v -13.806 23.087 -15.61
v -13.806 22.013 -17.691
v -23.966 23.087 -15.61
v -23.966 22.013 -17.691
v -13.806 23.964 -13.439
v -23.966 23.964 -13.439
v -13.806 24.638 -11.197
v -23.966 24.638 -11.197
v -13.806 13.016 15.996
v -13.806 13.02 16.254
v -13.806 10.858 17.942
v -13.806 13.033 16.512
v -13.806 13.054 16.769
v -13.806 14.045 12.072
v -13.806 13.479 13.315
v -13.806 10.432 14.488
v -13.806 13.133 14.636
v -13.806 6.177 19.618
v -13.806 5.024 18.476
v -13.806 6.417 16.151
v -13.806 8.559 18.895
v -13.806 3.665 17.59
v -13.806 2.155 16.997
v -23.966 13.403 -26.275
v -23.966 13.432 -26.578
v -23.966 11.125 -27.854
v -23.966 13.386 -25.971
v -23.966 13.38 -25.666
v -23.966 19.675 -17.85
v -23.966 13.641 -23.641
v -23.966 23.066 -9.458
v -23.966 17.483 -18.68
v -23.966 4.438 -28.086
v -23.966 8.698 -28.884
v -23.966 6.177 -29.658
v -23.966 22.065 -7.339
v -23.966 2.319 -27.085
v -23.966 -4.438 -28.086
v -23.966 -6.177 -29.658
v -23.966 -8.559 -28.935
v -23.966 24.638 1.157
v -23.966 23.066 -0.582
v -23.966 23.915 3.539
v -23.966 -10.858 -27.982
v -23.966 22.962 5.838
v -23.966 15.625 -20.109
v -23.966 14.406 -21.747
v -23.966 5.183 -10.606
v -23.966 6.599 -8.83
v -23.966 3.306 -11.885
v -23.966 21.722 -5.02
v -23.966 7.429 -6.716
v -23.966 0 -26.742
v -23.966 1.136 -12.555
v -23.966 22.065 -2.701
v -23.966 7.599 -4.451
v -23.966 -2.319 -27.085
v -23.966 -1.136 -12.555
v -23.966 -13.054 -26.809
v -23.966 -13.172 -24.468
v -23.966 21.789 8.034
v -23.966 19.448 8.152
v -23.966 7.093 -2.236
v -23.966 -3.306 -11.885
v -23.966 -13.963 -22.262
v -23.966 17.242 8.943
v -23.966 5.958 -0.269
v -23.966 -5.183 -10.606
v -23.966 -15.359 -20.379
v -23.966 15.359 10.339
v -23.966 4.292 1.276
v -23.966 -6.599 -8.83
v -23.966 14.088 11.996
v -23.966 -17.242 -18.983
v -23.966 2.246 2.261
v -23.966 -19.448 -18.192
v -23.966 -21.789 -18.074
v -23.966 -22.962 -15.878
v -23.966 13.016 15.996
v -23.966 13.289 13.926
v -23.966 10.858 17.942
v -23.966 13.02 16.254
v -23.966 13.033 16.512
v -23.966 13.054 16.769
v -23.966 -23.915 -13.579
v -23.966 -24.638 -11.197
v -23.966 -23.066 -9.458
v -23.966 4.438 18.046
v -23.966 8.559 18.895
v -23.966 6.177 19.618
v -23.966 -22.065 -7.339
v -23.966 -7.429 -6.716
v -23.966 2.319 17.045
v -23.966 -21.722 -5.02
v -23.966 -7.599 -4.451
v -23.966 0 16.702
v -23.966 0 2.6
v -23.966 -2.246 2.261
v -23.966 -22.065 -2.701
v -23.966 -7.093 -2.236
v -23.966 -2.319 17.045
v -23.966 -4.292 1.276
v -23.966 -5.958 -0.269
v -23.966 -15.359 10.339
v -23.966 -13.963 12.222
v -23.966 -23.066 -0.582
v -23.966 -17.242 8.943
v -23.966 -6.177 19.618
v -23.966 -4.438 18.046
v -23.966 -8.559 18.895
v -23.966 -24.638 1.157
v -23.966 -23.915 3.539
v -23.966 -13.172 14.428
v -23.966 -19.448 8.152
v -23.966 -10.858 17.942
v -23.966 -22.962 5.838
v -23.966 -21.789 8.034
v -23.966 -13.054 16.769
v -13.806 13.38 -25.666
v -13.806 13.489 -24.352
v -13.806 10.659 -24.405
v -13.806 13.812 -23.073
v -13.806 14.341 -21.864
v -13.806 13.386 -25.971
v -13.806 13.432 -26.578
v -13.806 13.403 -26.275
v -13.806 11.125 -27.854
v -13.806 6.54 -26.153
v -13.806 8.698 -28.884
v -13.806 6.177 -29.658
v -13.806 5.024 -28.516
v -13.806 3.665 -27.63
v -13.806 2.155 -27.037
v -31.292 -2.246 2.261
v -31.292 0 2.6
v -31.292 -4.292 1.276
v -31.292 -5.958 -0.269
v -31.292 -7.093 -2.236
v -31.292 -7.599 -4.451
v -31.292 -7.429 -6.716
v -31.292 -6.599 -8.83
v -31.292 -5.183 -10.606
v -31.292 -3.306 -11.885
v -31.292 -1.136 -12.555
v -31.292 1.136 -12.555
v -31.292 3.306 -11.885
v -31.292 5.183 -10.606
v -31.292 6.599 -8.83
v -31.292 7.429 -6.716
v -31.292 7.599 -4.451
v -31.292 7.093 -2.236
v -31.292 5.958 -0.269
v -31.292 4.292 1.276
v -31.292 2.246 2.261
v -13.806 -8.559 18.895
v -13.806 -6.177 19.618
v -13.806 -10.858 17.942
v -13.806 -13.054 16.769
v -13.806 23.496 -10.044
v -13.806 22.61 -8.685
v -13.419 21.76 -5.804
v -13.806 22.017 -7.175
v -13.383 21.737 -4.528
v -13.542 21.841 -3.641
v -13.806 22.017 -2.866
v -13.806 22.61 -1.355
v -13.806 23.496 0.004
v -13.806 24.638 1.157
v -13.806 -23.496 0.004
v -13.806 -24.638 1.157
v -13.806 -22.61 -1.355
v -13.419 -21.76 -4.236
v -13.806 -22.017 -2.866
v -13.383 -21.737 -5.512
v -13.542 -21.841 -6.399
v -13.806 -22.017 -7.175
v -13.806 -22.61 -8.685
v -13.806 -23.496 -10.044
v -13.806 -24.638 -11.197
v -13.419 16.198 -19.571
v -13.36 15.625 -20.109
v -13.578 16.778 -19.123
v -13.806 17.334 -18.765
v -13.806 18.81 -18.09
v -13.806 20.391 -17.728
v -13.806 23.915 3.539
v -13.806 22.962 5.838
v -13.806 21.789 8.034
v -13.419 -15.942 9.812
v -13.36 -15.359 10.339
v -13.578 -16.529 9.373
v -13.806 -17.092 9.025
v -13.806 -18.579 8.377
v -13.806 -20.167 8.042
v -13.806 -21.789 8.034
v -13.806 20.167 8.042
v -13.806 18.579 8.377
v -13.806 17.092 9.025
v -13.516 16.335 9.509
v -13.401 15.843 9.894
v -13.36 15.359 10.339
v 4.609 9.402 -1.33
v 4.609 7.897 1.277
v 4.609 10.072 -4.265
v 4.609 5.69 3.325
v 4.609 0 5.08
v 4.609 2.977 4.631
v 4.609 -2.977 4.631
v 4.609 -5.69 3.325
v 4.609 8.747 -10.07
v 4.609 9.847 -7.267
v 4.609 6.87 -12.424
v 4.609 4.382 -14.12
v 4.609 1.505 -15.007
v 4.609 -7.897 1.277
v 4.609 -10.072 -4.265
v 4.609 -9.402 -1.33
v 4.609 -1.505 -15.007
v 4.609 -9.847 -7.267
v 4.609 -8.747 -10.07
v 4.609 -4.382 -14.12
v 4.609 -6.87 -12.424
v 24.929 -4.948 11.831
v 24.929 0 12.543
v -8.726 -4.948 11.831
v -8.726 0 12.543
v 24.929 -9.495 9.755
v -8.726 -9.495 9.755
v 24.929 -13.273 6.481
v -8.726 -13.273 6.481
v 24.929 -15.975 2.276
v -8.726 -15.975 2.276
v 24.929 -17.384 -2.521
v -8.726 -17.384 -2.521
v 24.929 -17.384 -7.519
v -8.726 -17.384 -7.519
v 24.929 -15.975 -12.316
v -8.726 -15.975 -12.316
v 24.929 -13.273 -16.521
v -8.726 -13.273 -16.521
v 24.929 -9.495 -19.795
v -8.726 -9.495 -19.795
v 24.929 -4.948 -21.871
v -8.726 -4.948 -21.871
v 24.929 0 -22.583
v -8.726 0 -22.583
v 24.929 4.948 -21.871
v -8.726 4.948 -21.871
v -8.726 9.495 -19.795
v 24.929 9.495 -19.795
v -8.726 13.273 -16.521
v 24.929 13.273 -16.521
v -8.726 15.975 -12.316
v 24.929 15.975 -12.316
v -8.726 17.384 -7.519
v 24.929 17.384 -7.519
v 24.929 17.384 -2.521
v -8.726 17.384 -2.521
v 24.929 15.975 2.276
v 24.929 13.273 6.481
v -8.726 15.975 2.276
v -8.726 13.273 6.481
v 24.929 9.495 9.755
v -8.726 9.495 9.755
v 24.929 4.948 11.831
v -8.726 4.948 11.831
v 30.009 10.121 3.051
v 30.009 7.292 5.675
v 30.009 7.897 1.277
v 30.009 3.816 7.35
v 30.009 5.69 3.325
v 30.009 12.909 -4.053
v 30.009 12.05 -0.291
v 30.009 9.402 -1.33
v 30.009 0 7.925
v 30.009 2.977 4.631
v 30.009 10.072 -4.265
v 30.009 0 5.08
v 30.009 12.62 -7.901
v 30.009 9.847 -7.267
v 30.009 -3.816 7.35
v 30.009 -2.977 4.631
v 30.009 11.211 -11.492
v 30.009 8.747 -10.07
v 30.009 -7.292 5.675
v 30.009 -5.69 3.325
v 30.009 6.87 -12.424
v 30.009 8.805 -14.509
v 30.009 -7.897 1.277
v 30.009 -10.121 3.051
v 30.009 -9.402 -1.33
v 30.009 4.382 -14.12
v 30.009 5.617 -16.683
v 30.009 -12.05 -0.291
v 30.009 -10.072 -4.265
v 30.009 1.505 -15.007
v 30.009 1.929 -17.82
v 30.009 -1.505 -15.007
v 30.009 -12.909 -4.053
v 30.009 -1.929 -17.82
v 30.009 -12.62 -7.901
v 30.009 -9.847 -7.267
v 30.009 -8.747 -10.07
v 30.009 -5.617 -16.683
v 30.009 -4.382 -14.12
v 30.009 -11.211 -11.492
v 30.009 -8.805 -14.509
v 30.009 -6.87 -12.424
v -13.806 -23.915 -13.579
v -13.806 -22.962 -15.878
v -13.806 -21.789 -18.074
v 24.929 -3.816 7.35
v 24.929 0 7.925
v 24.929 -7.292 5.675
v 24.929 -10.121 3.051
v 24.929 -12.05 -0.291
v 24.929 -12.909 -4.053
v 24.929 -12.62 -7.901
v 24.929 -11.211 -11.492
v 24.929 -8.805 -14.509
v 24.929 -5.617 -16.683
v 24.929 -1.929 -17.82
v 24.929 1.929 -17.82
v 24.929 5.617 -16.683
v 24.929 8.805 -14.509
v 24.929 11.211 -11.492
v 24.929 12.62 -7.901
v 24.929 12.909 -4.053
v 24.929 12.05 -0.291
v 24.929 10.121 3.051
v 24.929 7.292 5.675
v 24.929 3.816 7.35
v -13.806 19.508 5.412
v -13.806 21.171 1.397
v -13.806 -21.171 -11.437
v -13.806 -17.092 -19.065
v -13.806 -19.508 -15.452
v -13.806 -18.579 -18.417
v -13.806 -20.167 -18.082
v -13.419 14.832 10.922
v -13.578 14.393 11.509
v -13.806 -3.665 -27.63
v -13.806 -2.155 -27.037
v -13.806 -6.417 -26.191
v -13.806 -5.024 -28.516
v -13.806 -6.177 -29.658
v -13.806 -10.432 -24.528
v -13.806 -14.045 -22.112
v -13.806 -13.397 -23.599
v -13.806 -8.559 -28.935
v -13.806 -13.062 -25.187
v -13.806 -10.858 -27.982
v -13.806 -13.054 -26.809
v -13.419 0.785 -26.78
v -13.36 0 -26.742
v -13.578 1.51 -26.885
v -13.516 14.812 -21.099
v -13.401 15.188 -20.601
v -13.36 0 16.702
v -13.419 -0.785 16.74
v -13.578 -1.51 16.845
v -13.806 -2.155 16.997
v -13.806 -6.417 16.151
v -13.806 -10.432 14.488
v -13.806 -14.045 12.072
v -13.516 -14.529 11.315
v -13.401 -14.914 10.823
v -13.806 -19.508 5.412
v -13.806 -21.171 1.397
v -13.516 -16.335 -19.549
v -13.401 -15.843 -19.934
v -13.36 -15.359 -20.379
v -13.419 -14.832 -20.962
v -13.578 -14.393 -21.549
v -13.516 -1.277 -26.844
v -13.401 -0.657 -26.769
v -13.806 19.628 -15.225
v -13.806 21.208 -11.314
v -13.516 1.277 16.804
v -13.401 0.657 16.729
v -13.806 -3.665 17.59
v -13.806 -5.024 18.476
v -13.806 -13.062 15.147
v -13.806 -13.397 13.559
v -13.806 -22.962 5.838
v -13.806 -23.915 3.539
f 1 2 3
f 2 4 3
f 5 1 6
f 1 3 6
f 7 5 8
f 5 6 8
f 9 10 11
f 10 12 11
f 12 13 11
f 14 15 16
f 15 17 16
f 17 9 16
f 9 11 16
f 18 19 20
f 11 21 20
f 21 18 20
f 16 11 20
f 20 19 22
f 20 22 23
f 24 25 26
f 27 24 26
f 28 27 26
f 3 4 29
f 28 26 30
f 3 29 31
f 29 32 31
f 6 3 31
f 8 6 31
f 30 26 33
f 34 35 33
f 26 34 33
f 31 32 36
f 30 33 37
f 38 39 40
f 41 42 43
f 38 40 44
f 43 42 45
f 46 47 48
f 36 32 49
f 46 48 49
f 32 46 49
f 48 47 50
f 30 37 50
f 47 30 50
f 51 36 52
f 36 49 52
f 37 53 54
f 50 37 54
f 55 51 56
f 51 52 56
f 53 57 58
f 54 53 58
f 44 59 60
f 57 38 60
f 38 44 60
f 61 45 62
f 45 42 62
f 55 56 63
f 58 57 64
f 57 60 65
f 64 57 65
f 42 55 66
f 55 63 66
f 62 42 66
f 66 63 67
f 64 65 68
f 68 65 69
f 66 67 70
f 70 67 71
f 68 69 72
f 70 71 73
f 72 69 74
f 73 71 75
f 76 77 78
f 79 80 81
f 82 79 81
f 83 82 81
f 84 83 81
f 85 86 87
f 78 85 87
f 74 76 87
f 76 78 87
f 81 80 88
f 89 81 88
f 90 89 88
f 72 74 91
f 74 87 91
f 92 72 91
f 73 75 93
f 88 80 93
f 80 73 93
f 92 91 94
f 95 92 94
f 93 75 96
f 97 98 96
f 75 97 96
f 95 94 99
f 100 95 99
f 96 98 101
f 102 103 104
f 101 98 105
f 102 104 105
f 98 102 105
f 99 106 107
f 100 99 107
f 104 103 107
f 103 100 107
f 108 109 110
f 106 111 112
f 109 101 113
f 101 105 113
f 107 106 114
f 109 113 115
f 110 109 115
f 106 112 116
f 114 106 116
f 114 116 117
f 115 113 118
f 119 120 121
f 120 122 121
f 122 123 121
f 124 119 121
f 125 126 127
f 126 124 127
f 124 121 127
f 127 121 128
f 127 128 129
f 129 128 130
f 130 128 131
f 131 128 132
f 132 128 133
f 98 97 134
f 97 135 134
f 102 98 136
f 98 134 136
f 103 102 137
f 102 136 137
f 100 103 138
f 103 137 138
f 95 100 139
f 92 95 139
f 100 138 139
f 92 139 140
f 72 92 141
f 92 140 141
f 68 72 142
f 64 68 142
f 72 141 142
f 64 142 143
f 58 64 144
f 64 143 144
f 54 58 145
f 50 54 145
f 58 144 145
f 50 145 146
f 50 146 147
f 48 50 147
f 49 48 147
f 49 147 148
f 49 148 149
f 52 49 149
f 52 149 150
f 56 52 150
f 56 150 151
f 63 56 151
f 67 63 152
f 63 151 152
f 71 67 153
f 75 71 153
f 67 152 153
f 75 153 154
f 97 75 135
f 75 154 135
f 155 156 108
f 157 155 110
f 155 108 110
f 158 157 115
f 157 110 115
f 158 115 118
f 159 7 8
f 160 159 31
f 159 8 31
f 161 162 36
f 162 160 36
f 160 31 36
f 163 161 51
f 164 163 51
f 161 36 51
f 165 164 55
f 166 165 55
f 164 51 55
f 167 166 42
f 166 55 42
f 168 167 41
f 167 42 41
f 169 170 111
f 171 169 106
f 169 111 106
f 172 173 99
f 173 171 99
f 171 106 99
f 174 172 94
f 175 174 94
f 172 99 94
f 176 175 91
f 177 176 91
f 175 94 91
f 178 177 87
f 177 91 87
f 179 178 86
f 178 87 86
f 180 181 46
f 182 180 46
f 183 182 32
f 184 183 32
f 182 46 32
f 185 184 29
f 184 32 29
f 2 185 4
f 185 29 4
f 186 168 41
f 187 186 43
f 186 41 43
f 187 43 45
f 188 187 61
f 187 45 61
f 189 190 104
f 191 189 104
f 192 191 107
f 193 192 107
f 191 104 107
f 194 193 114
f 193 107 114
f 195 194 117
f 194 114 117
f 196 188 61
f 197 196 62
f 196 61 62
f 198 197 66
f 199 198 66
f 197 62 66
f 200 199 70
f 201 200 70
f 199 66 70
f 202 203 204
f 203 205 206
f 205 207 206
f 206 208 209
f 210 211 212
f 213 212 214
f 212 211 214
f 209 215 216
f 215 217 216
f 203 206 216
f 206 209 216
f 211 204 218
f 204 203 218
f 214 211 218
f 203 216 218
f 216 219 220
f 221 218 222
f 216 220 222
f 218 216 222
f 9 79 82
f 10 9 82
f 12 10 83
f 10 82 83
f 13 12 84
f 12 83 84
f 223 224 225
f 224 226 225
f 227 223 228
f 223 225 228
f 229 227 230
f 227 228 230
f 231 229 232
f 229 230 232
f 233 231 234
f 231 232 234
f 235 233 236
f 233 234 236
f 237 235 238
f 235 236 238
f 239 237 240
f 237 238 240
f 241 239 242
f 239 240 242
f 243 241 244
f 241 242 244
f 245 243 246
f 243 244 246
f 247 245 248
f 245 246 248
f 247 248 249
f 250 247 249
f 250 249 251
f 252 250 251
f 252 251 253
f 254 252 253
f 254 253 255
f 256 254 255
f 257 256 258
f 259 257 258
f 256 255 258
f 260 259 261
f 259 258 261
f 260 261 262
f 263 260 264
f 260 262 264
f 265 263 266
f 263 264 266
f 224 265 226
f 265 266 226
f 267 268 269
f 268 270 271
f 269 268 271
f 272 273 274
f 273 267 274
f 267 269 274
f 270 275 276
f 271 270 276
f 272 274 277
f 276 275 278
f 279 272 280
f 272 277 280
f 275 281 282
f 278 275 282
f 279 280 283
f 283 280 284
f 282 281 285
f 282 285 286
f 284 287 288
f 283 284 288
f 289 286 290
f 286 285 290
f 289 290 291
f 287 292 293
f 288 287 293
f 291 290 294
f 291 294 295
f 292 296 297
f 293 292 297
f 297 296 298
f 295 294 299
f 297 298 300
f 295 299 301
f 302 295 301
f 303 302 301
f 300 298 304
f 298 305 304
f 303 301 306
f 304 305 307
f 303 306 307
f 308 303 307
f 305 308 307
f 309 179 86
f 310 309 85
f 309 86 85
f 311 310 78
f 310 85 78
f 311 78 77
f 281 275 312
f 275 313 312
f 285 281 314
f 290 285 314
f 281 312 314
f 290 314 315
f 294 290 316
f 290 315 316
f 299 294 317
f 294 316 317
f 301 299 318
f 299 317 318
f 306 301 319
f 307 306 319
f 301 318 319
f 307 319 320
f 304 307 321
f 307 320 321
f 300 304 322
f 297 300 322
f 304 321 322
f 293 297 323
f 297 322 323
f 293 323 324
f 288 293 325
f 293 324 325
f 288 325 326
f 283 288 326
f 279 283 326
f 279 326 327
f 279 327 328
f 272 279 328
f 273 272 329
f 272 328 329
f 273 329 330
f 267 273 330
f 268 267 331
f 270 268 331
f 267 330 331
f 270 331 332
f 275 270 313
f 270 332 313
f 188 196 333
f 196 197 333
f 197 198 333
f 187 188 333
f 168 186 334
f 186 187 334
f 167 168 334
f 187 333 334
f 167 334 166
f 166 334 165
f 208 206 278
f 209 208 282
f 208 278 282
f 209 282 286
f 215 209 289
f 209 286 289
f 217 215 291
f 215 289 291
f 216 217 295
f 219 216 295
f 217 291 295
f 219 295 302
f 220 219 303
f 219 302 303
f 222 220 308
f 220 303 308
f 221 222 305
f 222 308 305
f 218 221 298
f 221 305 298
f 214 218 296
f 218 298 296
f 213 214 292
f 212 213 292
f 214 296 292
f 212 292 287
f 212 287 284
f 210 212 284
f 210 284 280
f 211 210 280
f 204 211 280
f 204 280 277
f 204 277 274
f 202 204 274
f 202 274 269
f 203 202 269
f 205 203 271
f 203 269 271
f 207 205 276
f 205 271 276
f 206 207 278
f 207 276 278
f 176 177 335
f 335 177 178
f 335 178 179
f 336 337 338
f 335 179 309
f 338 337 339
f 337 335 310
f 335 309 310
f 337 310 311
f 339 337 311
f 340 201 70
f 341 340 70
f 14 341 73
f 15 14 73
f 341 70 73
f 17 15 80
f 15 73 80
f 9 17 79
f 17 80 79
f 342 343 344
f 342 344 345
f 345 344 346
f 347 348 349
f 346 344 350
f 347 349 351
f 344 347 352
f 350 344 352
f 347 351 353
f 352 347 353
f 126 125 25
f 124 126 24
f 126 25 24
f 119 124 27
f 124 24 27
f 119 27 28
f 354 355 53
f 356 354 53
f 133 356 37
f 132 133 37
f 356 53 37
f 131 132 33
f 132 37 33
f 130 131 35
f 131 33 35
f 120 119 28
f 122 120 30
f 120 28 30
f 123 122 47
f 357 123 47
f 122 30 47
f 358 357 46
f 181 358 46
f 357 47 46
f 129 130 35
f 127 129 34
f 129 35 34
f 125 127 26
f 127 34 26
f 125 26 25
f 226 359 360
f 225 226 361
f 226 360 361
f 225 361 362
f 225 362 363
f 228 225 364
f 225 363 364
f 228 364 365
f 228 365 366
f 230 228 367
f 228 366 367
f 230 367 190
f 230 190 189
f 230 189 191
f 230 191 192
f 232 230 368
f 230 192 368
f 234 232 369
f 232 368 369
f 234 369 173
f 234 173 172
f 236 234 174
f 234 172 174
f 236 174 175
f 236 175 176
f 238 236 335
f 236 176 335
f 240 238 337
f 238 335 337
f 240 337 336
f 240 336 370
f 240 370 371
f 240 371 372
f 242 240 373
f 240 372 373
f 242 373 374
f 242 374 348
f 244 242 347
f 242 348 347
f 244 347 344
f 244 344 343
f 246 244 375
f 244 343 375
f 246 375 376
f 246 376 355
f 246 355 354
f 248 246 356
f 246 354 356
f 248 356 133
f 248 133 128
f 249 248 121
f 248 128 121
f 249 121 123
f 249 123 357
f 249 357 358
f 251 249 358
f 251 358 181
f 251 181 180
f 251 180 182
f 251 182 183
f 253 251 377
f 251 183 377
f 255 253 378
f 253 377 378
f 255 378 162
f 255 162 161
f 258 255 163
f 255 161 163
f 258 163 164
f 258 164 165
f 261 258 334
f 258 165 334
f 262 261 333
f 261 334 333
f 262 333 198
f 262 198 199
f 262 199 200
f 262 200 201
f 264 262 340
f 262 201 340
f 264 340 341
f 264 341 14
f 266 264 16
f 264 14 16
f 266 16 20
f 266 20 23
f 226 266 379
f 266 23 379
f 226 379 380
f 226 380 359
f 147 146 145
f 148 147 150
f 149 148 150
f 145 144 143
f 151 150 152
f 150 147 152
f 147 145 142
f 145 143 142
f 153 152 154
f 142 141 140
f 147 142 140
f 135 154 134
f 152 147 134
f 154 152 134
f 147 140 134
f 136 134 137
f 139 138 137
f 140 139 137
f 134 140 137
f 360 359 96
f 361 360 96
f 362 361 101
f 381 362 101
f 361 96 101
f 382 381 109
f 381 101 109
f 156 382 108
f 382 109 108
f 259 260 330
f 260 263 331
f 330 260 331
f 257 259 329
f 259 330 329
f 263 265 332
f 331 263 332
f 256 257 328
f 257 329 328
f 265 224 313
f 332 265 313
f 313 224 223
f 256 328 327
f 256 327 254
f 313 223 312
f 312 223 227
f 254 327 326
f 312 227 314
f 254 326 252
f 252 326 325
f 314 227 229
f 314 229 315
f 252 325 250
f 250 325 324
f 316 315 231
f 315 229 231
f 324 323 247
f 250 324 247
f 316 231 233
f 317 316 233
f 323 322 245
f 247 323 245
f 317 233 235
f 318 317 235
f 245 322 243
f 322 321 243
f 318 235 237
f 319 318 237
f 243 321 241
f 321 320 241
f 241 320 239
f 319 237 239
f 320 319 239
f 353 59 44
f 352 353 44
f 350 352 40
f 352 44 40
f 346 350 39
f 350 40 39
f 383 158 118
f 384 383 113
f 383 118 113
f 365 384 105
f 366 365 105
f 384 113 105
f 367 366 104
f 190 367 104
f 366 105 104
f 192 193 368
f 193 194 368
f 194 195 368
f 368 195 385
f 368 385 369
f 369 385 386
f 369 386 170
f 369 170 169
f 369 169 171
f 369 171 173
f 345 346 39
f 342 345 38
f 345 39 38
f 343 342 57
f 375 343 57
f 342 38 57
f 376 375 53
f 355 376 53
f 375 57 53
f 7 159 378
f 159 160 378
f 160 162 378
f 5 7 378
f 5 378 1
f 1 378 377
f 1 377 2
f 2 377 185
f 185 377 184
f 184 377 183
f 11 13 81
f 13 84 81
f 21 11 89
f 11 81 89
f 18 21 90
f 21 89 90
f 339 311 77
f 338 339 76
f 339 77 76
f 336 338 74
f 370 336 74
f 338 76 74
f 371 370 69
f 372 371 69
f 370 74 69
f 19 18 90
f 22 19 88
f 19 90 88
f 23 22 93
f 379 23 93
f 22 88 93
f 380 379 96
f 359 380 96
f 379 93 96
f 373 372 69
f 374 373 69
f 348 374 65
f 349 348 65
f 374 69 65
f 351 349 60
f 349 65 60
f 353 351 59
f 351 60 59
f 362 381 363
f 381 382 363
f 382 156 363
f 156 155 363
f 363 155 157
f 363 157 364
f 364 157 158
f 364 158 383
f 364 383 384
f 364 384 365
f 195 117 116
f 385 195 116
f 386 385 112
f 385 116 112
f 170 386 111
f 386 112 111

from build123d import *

# Parameters (mm, degrees)
F2_R     = 8
F3_DEPTH = 25


with BuildPart() as f1:
    # F0 (on Front) → F1 (revolve)
    with BuildSketch(Plane.XZ):
        Polygon((24.92856, 7.9248), (24.92856, 12.542502), (-8.72644, 12.542502), (-13.80644, 17.102293), (-13.80644, 20.379981), (-23.96644, 20.379981), (-23.96644, 2.599981), (-31.292418, 2.599981), (-31.292418, -5.020019), (4.60856, -5.020019), (4.60856, 5.08), (30.00856, 5.08), (30.00856, 7.9248), align=None)
    revolve(axis=Axis((-13.341929, 0, -5.020019), (1, 0, 0)))

    # F2 (on face) → F3 (cut)
    with BuildSketch(Plane(origin=(-23.96644, 0, 0), x_dir=(0, -1, 0), z_dir=(-1, 0, 0))):
        with BuildLine():
            ThreePointArc((8, 24.70155), (-5.656854, 30.358404), (0, 16.70155))
            ThreePointArc((0, 16.70155), (5.656854, 19.044696), (8, 24.70155))
        make_face()
        with BuildLine():
            ThreePointArc((8, -34.741588), (5.656854, -29.084734), (0, -26.741588))
            ThreePointArc((0, -26.741588), (-5.656854, -40.398442), (8, -34.741588))
        make_face()
        with Locations((-29.721569, -5.020019)):
            Circle(F2_R)
        with BuildLine():
            ThreePointArc((37.721569, -5.020019), (29.721569, 2.979981), (21.721569, -5.020019))
            ThreePointArc((21.721569, -5.020019), (29.721569, -13.020019), (37.721569, -5.020019))
        make_face()
        with BuildLine():
            ThreePointArc((-13.016323, 15.996304), (-28.407359, 19.057771), (-15.359469, 10.33945))
            ThreePointArc((-15.359469, 10.33945), (-13.625287, 12.934836), (-13.016323, 15.996304))
        make_face()
        with BuildLine():
            ThreePointArc((29.016323, 15.996304), (17.954856, 23.38734), (15.359469, 10.33945))
            ThreePointArc((15.359469, 10.33945), (24.07779, 8.605268), (29.016323, 15.996304))
        make_face()
        with BuildLine():
            ThreePointArc((29.016323, -26.036342), (24.07779, -18.645306), (15.359469, -20.379488))
            ThreePointArc((15.359469, -20.379488), (17.954856, -33.427378), (29.016323, -26.036342))
        make_face()
        with BuildLine():
            ThreePointArc((-13.379907, -25.666356), (-13.962437, -22.669503), (-15.625189, -20.109089))
            ThreePointArc((-15.625189, -20.109089), (-28.797378, -28.663208), (-13.379907, -25.666356))
        make_face()
    extrude(amount=-F3_DEPTH, mode=Mode.SUBTRACT)


solid = f1.part
